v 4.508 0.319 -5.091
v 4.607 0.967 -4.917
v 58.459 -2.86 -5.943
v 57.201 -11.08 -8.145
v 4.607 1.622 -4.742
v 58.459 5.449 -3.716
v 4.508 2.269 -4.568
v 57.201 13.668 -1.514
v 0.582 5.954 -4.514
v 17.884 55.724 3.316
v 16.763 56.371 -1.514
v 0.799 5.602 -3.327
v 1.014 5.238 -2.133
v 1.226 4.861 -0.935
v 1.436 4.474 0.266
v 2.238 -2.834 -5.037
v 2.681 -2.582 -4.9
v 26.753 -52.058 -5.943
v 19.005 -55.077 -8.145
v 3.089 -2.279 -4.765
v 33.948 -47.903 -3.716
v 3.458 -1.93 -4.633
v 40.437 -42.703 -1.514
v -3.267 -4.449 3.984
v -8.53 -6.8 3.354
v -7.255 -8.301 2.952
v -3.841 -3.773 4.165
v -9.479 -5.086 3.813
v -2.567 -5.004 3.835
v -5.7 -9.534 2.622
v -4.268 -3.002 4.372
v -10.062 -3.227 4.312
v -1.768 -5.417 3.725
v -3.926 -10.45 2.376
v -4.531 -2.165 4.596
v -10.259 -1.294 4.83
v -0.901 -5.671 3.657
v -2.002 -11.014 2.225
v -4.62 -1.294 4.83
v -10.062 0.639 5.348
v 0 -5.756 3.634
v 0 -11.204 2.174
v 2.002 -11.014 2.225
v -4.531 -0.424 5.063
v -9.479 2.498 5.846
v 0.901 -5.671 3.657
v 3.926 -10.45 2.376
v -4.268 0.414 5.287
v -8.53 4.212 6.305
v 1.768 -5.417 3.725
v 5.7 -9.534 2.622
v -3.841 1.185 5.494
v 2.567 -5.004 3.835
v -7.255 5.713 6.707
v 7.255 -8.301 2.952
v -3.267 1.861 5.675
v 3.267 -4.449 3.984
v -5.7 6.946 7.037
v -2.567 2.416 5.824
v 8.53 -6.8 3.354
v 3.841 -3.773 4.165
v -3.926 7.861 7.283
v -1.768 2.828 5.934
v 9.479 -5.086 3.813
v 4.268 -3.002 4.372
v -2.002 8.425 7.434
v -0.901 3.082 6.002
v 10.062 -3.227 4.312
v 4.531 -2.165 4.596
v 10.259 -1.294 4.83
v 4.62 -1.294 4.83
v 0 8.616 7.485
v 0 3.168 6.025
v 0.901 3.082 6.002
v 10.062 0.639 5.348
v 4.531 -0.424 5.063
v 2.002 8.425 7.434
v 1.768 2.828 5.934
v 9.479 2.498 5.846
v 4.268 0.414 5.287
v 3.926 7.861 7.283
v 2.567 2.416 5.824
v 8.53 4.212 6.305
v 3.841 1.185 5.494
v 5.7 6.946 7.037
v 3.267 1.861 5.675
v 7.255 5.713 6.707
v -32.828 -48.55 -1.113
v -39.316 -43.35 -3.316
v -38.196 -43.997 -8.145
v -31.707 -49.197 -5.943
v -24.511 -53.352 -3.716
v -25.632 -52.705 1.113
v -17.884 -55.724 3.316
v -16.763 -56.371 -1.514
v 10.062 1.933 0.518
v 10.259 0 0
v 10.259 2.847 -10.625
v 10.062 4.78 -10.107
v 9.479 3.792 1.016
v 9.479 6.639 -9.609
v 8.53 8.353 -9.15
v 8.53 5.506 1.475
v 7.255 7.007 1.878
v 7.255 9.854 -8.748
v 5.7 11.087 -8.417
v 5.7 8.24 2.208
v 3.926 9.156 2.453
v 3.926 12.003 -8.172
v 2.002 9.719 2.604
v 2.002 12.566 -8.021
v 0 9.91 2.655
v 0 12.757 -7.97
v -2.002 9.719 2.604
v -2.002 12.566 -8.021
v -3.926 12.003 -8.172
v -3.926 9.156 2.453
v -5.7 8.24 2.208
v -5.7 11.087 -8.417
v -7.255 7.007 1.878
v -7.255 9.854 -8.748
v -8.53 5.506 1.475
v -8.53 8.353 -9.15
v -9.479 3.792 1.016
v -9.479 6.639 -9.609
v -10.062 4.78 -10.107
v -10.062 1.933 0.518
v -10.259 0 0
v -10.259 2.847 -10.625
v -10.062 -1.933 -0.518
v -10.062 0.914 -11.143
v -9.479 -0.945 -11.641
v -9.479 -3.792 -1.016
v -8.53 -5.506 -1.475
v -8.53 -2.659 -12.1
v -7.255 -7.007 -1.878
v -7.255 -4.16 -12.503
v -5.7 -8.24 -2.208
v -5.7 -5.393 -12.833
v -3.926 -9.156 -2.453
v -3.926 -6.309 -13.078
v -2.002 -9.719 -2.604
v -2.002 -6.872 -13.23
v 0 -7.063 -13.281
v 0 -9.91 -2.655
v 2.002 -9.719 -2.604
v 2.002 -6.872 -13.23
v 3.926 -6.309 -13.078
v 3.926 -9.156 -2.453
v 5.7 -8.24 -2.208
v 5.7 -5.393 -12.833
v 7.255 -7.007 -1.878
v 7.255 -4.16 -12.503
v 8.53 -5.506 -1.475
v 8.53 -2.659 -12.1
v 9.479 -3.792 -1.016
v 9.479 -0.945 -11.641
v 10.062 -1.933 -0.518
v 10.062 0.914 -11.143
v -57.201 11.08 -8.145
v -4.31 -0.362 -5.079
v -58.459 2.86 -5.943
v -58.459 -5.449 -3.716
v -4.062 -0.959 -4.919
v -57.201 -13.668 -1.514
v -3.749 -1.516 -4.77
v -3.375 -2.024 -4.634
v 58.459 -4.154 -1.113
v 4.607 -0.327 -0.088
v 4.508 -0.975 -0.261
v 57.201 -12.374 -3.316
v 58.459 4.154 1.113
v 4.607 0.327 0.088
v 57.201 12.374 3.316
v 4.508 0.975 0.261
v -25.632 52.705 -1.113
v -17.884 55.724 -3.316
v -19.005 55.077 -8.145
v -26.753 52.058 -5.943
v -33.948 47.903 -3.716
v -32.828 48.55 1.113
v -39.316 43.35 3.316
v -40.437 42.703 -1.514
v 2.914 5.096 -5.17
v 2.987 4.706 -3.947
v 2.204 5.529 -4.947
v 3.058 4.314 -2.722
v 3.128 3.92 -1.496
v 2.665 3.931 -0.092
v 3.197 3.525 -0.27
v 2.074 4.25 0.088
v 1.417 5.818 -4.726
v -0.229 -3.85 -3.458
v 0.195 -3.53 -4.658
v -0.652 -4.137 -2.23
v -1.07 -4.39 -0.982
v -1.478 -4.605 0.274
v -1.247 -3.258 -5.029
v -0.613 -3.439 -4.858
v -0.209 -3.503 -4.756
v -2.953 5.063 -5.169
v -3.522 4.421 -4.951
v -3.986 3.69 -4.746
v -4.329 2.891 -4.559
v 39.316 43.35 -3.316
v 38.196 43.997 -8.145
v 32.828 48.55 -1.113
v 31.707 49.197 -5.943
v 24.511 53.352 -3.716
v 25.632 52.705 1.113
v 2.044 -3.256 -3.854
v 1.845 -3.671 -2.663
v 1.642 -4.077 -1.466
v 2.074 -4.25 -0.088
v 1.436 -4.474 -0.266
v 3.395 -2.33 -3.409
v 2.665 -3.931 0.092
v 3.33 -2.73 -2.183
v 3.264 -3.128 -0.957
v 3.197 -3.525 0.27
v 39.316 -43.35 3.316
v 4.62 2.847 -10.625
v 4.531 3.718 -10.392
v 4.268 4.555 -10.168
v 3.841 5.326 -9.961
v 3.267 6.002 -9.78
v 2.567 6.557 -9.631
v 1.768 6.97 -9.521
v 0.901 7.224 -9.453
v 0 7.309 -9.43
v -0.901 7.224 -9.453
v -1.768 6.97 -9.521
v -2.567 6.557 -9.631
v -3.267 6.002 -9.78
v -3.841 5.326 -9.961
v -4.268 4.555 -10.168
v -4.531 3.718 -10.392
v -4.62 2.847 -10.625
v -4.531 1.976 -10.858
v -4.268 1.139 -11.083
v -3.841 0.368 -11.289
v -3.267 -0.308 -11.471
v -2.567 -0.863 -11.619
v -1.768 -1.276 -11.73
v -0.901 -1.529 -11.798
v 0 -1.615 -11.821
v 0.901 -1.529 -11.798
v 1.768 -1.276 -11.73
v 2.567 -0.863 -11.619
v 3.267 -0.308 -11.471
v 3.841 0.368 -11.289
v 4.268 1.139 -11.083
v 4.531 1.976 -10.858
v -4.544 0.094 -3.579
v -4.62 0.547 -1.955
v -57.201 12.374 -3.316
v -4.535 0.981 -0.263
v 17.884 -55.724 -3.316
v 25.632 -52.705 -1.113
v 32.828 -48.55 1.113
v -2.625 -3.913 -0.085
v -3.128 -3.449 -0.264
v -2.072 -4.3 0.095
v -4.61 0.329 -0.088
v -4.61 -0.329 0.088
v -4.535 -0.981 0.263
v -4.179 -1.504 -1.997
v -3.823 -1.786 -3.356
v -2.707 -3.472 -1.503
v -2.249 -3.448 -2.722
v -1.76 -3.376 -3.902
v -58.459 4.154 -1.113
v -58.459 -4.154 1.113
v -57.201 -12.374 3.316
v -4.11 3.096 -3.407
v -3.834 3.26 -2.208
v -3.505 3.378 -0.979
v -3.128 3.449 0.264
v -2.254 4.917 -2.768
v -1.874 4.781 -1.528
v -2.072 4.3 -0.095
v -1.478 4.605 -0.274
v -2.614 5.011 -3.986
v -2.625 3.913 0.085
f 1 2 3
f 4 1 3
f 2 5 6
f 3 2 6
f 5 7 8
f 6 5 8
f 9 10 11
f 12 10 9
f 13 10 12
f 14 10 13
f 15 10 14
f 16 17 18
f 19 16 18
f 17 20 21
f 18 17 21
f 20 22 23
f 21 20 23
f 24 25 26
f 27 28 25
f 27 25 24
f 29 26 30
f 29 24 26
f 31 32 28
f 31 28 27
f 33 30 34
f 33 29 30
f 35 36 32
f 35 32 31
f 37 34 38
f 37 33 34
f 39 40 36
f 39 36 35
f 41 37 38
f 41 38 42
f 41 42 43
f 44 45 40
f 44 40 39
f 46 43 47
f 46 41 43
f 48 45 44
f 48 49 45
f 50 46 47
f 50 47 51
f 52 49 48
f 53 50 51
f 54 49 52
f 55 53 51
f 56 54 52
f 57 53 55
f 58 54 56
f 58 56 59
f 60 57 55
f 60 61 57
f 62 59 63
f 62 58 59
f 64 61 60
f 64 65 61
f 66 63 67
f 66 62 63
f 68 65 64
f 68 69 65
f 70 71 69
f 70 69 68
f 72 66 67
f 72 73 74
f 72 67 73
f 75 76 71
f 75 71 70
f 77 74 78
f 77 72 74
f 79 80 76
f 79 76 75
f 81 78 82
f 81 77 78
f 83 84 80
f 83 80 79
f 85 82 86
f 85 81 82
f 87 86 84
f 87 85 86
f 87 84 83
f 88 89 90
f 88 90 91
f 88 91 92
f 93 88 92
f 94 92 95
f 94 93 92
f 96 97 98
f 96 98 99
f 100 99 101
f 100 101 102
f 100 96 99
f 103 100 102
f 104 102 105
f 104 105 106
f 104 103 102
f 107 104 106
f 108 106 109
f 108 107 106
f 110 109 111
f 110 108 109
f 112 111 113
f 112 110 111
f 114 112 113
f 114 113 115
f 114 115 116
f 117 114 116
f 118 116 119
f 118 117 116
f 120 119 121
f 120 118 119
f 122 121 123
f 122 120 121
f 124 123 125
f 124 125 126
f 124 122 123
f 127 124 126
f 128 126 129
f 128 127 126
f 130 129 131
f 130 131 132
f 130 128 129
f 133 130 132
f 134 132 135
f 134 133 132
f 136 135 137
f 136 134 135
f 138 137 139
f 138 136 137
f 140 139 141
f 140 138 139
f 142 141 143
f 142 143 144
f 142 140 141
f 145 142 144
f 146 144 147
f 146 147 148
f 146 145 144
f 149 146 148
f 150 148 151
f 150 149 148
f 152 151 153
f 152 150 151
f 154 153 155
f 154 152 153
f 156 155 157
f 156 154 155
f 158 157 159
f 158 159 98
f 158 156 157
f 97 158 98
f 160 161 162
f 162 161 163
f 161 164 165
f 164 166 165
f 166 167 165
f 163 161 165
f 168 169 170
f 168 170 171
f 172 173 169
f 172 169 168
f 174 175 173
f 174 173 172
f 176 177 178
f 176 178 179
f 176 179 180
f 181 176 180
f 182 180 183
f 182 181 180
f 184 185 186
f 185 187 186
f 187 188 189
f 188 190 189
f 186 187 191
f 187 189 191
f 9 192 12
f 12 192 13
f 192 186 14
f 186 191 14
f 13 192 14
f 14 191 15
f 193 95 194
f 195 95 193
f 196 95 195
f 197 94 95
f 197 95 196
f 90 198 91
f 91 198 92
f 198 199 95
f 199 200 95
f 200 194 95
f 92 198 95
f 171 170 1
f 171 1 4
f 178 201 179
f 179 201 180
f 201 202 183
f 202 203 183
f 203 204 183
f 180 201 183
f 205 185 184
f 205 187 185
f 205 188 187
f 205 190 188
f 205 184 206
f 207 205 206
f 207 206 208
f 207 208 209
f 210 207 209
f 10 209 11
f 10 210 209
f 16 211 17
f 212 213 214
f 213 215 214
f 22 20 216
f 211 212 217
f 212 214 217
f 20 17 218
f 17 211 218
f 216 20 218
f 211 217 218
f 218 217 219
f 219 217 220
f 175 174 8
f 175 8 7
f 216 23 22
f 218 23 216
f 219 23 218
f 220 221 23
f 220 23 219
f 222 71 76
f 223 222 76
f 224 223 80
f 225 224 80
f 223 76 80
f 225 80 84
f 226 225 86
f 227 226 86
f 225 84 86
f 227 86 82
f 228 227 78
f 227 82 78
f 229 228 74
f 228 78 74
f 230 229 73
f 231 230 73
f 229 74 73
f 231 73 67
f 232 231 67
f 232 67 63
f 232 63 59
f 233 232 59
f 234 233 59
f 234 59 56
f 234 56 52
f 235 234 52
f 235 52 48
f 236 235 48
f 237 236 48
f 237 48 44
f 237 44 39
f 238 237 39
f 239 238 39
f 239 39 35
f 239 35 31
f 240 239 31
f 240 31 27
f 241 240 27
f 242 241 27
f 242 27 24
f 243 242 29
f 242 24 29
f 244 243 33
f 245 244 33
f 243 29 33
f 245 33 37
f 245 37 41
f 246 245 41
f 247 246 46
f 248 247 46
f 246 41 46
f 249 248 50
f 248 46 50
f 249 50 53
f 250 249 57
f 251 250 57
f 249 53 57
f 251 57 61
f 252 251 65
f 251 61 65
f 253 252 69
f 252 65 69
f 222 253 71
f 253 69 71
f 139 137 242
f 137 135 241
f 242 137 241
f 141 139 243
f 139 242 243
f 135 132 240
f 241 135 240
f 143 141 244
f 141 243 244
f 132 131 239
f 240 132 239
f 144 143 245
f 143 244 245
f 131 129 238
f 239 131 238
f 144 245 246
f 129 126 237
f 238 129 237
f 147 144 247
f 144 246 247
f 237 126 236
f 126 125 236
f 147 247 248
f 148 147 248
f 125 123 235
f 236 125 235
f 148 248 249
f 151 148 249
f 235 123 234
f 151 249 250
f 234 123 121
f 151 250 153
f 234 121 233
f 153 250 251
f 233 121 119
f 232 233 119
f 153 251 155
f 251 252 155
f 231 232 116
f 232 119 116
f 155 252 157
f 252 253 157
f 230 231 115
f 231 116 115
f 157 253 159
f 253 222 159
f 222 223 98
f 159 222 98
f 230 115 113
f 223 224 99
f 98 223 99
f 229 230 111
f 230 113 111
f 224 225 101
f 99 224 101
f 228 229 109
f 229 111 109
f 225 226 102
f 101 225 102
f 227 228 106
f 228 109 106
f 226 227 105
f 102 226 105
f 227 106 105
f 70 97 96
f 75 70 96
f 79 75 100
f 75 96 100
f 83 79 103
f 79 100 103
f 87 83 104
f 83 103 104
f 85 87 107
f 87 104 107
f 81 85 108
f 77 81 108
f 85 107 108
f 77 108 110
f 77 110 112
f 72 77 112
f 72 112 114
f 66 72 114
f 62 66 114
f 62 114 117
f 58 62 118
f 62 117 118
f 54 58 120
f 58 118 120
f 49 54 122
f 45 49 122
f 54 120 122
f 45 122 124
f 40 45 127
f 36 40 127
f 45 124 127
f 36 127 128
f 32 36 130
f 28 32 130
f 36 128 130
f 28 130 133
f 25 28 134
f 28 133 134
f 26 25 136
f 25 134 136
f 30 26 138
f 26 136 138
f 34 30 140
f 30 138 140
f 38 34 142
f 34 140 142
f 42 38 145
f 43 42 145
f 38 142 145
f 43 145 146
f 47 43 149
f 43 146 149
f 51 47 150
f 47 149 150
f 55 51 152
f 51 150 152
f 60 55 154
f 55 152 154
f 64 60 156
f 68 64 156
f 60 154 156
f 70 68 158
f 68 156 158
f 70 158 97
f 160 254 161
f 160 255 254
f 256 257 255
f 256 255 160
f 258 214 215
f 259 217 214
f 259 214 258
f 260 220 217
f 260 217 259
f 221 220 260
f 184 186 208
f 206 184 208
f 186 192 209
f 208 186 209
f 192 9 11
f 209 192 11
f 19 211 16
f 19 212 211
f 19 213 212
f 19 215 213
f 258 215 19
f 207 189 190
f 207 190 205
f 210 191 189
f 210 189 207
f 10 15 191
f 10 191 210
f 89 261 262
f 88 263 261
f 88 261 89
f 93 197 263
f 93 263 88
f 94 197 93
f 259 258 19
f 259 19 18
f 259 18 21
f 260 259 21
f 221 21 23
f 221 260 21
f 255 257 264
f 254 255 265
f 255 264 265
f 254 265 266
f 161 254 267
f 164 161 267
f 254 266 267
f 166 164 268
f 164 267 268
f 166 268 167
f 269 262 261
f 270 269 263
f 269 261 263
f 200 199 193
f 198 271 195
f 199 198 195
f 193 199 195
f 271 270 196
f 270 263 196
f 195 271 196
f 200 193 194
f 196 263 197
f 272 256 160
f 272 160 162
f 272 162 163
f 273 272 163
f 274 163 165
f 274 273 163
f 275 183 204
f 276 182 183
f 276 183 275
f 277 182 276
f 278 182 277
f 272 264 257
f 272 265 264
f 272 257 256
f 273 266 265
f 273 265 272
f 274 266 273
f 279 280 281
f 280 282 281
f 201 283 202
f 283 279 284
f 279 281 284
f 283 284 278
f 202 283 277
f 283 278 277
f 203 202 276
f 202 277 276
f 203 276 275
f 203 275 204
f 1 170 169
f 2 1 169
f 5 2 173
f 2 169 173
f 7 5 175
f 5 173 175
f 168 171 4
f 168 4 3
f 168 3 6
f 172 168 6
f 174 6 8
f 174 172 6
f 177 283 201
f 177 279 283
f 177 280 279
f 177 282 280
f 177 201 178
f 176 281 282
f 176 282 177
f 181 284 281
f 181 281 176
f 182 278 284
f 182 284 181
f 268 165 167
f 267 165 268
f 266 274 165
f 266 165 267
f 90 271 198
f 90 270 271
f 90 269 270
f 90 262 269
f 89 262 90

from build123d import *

# Parameters (mm, degrees)
F1_DEPTH       = 5
F3_ANGLE       = 15
F5_COUNT       = 6
F6_R           = 10.2594624762
F7_DEPTH       = 11
F7_DEPTH_BACK  = 5
F8_ANGLE       = 15
F9_R           = 4.6196588687
F10_DEPTH      = 25
F10_DEPTH_BACK = 25


with BuildPart() as f1:
    # F0 (on Top) → F1 (new body)
    with BuildSketch(Plane.XY):
        with BuildLine():
            Line((57.2005063295, 12.8105310723), (0, 0))
            Line((0, 0), (57.2005063295, -12.8105310723))
            ThreePointArc((57.2005063295, -12.8105310723), (58.6174686481, 0), (57.2005063295, 12.8105310723))
        make_face()
    extrude(amount=-F1_DEPTH)


with BuildPart() as f1_1:
    # F3: moved
    add(f1.part.rotate(Axis((29.8989806324, 0, 0), (1, 0, 0)), F3_ANGLE))


with BuildPart() as f5_1:
    # F5: instance of F1
    add(f1_1.part.rotate(Axis((0, 0, -5.2907112986), (0, 0, -1)), 1 * 360 / F5_COUNT))


with BuildPart() as f5_2:
    # F5: instance of F1
    add(f1_1.part.rotate(Axis((0, 0, -5.2907112986), (0, 0, -1)), 2 * 360 / F5_COUNT))


with BuildPart() as f5_3:
    # F5: instance of F1
    add(f1_1.part.rotate(Axis((0, 0, -5.2907112986), (0, 0, -1)), 3 * 360 / F5_COUNT))


with BuildPart() as f5_4:
    # F5: instance of F1
    add(f1_1.part.rotate(Axis((0, 0, -5.2907112986), (0, 0, -1)), 4 * 360 / F5_COUNT))


with BuildPart() as f5_5:
    # F5: instance of F1
    add(f1_1.part.rotate(Axis((0, 0, -5.2907112986), (0, 0, -1)), 5 * 360 / F5_COUNT))


with BuildPart() as f7:
    # F6 (on Top) → F7 (new body, two sides)
    with BuildSketch(Plane.XY) as f7_sk:
        Circle(F6_R)
    extrude(amount=-F7_DEPTH)
    extrude(f7_sk.sketch, amount=F7_DEPTH_BACK)


with BuildPart() as f7_1:
    # F8: moved
    add(f7.part.rotate(Axis((29.8989806324, 0, 0), (1, 0, 0)), F8_ANGLE))


with BuildPart() as f10:
    # F9 (on face) → F10 (new body, two sides)
    with BuildSketch(Plane(origin=(0, -1.2940952255, 4.8296291314), x_dir=(1, 0, 0), z_dir=(0, -0.2588190451, 0.9659258263))) as f10_sk:
        Circle(F9_R)
    extrude(amount=-F10_DEPTH)
    extrude(f10_sk.sketch, amount=F10_DEPTH_BACK)


with BuildPart() as f7_2:
    add(f7_1.part)

    # F11: cut F10
    add(f10.part, mode=Mode.SUBTRACT)


with BuildPart() as f5_4_1:
    add(f5_4.part)

    # F11: cut F10
    add(f10.part, mode=Mode.SUBTRACT)


with BuildPart() as f5_3_1:
    add(f5_3.part)

    # F11: cut F10
    add(f10.part, mode=Mode.SUBTRACT)


with BuildPart() as f5_2_1:
    add(f5_2.part)

    # F11: cut F10
    add(f10.part, mode=Mode.SUBTRACT)


with BuildPart() as f5_1_1:
    add(f5_1.part)

    # F11: cut F10
    add(f10.part, mode=Mode.SUBTRACT)


with BuildPart() as f1_2:
    add(f1_1.part)

    # F11: cut F10
    add(f10.part, mode=Mode.SUBTRACT)


with BuildPart() as f5_5_1:
    add(f5_5.part)

    # F11: cut F10
    add(f10.part, mode=Mode.SUBTRACT)


solid = Compound([f7_2.part, f5_4_1.part, f5_3_1.part, f5_2_1.part, f5_1_1.part, f1_2.part, f5_5_1.part])
